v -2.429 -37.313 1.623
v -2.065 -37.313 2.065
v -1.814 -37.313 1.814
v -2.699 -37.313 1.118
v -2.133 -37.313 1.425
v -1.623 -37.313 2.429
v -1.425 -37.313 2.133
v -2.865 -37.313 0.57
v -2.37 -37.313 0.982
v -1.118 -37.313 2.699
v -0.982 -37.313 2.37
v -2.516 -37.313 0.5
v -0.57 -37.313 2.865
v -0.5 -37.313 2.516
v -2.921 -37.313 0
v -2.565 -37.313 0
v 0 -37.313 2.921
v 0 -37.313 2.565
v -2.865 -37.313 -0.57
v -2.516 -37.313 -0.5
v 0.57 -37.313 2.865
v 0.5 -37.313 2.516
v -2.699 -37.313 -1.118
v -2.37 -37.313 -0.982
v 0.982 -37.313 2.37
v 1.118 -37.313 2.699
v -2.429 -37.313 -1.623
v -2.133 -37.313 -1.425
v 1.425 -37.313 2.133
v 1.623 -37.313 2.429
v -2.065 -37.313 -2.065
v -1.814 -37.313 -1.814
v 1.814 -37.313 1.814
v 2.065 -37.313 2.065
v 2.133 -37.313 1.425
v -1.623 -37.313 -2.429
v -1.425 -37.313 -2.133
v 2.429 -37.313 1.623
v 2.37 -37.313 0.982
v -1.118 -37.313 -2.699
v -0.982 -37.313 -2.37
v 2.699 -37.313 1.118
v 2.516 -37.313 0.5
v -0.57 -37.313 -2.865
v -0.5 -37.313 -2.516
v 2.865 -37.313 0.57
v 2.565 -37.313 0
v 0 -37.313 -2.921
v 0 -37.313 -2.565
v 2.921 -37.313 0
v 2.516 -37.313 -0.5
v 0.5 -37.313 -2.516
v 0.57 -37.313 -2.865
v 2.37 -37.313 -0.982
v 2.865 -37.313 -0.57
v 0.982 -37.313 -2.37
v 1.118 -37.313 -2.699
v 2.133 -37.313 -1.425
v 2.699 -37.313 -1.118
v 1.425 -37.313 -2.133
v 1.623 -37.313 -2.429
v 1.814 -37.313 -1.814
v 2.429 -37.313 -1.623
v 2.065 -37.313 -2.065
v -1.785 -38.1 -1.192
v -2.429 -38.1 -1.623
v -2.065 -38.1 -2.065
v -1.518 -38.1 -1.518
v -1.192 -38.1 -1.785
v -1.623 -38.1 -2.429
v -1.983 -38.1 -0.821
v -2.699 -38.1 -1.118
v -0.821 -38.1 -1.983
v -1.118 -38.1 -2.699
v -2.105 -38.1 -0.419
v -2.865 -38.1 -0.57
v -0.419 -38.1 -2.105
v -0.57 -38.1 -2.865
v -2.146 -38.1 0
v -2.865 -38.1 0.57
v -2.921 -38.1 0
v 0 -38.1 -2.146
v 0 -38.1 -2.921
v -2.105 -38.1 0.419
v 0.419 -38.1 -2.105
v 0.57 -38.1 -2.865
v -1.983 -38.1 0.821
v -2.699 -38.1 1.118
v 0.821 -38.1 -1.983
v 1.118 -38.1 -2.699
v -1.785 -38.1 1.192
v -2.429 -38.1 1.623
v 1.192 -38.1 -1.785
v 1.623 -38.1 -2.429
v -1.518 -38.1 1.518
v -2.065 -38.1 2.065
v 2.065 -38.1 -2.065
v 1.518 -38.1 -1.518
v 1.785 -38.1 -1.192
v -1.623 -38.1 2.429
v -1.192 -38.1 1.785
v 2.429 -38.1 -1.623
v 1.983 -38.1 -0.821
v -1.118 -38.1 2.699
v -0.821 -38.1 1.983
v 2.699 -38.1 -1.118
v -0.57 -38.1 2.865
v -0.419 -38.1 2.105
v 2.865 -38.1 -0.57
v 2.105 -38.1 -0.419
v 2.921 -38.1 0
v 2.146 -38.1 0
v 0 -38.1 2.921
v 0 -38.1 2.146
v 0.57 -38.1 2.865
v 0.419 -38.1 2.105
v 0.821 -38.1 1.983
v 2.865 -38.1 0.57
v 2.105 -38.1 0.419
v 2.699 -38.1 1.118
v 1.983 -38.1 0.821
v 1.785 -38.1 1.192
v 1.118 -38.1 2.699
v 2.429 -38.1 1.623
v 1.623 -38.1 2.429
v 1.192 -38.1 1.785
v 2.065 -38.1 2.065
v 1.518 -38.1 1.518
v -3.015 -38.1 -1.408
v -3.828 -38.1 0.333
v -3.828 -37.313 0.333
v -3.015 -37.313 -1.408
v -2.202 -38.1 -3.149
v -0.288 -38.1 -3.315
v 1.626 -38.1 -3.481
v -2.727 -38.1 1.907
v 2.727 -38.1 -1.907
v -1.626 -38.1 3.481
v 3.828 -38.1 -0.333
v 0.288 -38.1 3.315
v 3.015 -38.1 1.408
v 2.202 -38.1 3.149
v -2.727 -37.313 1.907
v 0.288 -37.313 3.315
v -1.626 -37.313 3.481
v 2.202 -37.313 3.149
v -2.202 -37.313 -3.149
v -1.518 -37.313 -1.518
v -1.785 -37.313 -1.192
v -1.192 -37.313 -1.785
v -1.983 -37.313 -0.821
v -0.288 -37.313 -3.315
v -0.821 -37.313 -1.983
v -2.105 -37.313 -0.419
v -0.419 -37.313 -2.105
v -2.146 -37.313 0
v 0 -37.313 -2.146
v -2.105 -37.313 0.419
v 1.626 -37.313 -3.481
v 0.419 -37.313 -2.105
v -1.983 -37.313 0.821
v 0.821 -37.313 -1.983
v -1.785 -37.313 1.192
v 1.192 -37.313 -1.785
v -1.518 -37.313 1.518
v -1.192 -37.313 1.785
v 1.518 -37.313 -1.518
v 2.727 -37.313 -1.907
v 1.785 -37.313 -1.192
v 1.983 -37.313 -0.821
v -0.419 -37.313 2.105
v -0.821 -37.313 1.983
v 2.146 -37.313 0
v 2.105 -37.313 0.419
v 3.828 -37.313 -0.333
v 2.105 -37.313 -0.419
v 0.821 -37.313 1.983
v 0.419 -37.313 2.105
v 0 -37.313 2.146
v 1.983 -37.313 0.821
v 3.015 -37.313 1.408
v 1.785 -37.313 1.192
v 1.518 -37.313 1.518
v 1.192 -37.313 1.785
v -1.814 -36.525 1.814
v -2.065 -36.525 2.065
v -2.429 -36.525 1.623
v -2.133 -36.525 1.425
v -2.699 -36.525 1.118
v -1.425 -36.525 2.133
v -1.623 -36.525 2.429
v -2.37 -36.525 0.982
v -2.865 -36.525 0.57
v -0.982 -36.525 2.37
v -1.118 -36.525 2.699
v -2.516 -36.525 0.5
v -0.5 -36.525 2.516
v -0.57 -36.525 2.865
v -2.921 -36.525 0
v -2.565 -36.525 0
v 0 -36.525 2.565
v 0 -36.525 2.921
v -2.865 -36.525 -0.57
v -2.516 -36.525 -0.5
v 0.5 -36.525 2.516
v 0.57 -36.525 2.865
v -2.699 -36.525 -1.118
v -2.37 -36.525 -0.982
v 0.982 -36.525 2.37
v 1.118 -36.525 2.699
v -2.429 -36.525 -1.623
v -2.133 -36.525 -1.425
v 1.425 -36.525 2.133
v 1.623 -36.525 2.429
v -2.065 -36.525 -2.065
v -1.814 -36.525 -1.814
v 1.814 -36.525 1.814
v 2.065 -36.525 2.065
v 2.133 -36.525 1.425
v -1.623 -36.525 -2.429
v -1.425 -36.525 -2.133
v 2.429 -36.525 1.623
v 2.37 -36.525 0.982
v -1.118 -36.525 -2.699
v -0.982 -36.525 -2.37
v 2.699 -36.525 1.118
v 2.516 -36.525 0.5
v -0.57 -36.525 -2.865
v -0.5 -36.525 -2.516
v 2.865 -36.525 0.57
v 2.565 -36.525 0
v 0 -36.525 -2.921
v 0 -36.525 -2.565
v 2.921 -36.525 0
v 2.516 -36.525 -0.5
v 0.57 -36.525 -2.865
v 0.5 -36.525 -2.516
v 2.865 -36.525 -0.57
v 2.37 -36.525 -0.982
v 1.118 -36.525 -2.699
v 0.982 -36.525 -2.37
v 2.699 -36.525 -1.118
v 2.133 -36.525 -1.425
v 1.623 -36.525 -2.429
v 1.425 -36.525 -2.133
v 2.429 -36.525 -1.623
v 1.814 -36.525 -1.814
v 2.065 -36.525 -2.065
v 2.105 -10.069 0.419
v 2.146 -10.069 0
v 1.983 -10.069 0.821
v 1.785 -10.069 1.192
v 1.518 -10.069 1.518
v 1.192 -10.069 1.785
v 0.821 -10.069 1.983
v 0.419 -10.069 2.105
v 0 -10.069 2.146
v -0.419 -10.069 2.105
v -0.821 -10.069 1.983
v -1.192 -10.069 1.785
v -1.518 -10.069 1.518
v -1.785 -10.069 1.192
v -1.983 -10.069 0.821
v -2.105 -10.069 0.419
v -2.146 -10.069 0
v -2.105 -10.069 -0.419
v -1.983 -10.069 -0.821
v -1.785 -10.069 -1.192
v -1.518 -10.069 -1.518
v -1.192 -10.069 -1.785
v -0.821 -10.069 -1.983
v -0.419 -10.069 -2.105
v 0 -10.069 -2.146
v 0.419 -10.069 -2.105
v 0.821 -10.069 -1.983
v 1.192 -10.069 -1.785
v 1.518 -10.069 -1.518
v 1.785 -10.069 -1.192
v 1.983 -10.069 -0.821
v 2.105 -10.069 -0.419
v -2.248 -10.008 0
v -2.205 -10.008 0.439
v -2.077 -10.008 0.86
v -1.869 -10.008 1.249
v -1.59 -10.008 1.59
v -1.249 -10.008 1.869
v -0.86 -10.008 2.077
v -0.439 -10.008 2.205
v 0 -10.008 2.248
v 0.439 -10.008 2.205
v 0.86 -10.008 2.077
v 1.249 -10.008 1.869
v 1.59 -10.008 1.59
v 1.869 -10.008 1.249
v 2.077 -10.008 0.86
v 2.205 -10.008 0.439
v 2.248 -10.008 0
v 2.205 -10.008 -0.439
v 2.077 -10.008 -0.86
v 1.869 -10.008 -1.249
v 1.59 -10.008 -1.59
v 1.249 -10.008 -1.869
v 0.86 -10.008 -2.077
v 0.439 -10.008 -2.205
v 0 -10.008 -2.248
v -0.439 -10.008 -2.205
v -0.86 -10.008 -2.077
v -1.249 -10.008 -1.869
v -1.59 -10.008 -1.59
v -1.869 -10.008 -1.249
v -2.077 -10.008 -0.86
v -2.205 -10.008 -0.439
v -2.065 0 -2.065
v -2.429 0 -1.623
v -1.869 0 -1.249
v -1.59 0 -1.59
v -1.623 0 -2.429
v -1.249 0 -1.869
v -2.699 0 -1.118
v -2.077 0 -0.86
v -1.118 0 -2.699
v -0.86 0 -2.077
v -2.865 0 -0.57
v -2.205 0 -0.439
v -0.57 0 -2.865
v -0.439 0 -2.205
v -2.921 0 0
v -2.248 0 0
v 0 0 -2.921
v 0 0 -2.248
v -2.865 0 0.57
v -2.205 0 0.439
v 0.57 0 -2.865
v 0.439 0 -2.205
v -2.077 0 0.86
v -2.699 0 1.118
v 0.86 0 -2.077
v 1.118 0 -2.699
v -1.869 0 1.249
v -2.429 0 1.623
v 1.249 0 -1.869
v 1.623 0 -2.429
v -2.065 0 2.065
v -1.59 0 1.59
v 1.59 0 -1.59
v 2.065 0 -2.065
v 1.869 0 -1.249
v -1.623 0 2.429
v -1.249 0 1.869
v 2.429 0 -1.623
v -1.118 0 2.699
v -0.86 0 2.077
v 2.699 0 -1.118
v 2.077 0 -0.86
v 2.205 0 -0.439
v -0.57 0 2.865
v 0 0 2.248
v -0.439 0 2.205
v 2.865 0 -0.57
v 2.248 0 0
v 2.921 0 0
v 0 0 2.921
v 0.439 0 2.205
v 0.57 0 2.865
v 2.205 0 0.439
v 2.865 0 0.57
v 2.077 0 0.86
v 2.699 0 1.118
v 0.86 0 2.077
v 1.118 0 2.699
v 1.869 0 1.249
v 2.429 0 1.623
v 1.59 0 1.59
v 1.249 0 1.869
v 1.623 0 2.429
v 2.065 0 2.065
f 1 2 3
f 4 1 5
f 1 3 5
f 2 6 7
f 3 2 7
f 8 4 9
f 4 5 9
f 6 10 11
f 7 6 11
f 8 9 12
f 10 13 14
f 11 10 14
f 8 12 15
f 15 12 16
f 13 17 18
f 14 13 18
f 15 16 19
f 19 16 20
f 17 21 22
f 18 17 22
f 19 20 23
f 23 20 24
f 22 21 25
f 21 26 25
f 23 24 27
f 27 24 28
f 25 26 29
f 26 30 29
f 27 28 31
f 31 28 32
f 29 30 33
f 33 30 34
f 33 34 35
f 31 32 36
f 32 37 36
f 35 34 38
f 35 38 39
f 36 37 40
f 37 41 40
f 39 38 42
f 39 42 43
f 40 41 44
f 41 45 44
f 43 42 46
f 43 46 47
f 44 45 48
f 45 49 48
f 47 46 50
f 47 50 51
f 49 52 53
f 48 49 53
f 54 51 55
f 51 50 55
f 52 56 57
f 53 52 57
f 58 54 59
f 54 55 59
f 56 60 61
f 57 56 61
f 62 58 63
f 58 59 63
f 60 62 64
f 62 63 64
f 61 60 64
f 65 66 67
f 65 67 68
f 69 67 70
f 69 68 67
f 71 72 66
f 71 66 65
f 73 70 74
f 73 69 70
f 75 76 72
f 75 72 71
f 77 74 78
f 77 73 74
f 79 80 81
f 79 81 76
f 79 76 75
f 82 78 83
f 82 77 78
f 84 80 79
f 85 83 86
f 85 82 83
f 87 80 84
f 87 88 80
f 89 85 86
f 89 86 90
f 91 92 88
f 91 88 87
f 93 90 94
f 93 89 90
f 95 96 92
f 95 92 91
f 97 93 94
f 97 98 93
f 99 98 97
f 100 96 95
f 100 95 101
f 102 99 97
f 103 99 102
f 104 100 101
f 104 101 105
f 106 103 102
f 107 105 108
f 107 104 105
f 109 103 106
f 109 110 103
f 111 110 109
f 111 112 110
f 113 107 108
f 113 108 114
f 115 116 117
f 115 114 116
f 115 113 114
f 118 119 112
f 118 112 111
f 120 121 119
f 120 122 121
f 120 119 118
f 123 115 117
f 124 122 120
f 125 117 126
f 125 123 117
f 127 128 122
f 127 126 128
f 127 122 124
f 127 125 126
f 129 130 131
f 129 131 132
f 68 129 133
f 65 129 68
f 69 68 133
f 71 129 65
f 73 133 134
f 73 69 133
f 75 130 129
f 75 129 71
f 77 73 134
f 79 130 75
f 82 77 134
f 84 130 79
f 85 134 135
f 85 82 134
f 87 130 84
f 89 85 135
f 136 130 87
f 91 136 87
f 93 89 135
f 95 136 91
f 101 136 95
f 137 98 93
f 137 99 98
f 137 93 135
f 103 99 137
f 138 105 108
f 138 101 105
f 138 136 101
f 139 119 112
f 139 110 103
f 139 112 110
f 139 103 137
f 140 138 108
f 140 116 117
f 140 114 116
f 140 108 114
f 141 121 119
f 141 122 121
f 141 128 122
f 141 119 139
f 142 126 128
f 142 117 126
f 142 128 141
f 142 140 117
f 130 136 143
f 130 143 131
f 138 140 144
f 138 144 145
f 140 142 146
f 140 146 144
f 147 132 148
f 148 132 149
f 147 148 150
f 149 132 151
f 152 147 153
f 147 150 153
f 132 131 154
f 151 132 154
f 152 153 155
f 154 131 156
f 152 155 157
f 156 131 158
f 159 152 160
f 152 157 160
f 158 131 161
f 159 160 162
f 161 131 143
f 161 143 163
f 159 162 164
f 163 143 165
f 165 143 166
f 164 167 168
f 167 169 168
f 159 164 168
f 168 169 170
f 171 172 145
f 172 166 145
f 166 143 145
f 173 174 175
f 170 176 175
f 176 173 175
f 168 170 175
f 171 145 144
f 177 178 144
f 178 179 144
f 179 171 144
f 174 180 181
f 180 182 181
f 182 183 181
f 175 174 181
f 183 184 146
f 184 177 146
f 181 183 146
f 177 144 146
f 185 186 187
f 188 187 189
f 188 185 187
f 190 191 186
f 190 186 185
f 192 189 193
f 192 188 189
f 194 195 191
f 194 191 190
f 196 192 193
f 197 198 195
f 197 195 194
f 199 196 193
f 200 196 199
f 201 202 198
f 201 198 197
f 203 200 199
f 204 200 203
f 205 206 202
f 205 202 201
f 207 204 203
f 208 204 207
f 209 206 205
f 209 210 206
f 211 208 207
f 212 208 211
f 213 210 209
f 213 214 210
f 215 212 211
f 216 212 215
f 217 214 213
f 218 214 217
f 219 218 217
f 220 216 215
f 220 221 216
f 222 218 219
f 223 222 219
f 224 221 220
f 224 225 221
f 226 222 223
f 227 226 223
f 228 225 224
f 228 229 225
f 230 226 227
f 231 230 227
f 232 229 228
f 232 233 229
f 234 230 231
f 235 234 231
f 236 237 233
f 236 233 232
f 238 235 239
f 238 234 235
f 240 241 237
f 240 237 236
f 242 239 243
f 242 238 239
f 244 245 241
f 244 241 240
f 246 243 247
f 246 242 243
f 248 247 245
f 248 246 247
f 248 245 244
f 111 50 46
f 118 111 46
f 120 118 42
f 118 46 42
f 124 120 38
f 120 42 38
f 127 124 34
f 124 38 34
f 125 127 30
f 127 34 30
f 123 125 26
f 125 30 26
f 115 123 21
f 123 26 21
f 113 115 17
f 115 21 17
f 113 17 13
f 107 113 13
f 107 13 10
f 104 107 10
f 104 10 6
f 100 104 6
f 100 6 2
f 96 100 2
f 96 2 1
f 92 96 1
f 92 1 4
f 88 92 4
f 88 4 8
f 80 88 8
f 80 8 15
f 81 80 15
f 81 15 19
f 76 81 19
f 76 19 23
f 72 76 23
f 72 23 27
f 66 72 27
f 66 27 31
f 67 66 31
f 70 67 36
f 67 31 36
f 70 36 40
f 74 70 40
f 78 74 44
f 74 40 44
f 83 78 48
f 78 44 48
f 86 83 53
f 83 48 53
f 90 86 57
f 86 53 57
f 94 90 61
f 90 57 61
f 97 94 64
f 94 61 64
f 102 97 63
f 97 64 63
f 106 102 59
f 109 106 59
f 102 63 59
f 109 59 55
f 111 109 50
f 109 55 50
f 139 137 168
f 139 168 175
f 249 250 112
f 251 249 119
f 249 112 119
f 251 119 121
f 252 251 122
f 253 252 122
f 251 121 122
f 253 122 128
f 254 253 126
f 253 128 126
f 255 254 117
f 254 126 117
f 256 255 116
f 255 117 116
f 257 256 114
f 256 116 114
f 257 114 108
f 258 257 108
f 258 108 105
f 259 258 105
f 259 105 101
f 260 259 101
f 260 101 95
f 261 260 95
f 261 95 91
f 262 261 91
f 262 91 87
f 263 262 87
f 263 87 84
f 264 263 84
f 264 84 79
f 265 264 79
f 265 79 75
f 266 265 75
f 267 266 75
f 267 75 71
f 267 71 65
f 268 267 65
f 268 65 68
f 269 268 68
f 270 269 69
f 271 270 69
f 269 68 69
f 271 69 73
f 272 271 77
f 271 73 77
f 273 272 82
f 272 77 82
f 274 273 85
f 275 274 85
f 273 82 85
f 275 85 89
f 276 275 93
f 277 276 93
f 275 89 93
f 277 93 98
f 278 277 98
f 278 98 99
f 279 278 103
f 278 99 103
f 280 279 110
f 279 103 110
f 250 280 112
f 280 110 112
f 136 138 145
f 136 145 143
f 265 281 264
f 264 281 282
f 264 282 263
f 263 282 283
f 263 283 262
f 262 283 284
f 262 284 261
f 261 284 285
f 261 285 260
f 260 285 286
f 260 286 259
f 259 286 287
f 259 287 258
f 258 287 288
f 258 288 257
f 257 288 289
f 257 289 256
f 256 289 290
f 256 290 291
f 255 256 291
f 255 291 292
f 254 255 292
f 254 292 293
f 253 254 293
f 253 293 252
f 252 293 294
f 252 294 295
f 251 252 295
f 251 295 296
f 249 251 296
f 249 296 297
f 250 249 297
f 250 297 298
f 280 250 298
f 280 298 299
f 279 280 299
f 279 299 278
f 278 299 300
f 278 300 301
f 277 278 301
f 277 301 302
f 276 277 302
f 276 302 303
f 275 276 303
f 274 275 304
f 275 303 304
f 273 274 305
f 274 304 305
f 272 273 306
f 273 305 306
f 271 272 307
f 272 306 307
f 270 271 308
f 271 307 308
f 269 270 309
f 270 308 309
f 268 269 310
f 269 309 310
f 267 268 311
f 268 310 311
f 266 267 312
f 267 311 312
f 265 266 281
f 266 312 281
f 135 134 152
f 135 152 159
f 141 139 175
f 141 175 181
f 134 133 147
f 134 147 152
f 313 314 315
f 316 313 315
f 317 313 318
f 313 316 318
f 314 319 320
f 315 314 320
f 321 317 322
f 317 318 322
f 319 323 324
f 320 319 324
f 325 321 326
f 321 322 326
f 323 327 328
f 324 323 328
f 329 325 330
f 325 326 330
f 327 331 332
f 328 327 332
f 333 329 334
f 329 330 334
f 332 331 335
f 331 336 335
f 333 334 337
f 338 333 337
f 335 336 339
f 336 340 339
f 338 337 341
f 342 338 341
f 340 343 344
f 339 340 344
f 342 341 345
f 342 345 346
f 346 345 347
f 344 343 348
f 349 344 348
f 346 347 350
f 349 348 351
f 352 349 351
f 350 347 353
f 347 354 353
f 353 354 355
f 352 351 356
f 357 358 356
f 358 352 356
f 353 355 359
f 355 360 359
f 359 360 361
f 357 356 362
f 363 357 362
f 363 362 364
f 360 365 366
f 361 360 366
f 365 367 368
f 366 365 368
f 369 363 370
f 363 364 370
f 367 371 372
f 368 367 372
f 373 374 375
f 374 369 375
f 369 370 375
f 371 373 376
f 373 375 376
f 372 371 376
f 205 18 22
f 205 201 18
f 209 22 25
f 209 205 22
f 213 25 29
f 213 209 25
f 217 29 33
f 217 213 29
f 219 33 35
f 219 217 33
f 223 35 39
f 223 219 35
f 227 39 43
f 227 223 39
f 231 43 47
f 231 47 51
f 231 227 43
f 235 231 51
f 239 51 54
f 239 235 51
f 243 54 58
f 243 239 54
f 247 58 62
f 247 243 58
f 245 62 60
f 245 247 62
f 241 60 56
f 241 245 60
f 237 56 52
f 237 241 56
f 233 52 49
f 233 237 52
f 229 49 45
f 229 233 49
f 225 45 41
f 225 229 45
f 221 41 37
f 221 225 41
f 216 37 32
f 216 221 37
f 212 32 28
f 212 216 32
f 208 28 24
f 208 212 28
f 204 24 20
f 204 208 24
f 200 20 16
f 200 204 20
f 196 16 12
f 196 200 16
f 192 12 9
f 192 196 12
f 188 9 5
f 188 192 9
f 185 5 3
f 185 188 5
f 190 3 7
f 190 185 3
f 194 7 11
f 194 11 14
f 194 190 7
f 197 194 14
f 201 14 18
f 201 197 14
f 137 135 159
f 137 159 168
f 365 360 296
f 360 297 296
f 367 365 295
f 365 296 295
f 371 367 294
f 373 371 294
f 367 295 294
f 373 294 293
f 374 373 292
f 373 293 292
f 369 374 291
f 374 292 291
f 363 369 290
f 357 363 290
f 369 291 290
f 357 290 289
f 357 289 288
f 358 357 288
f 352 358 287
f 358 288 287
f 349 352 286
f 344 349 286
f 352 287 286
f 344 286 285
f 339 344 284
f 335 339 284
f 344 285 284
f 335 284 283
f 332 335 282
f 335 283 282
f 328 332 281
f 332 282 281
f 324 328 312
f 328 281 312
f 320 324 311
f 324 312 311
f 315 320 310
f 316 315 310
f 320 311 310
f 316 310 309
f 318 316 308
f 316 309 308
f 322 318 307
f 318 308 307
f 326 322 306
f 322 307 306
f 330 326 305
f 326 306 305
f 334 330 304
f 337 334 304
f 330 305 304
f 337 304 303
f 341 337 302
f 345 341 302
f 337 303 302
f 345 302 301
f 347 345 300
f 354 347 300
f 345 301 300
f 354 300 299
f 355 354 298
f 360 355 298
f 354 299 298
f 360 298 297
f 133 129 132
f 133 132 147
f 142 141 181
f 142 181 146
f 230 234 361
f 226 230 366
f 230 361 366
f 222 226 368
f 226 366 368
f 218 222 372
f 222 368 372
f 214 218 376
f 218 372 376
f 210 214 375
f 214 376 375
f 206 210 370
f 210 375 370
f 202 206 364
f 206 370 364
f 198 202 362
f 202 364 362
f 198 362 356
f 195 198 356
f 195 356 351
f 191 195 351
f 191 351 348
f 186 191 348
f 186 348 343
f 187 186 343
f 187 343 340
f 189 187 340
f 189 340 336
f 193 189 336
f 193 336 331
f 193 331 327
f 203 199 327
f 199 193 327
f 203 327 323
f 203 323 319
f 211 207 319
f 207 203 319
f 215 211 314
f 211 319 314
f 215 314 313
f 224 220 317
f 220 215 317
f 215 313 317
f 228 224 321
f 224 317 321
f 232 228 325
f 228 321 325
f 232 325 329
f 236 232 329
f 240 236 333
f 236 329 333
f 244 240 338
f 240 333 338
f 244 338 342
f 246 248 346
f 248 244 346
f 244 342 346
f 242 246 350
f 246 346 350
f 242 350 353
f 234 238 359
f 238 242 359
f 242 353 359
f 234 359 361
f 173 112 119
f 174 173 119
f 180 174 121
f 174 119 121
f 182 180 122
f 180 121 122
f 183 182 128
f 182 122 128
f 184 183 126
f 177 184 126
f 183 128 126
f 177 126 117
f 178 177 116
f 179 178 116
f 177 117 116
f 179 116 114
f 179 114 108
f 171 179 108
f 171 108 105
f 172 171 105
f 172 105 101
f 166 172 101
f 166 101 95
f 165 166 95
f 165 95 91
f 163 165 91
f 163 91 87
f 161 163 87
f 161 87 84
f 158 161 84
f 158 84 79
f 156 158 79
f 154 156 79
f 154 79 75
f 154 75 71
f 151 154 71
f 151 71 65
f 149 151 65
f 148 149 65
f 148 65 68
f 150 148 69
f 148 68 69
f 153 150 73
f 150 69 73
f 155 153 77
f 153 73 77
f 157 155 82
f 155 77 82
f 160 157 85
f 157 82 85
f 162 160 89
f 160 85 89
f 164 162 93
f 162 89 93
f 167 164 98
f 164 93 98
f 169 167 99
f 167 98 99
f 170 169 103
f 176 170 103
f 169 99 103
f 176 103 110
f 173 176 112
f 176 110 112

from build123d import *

# Parameters (mm, degrees)
F0_R      = 2.921
F1_DEPTH  = 38.1
F3_DEPTH  = 0.7874
F5_W      = 0.7874
F5_H      = 0.3556
F8_D      = 4.4958
F8_DEPTH  = 10.0076
F8_TIP    = 1.3506745855
F9_R      = 2.1463
F10_DEPTH = 35.56


with BuildPart() as f1:
    # F0 (on Front) → F1 (new body)
    with BuildSketch(Plane.XZ):
        Circle(F0_R)
    extrude(amount=F1_DEPTH)

    # F5 (on Right) → F6 (revolve, cut)
    with BuildSketch(Plane.YZ):
        with Locations((-36.9189, 2.7432)):
            Rectangle(F5_W, F5_H)
    revolve(axis=Axis((0, -34.1169198469, 0), (0, 1, 0)), mode=Mode.SUBTRACT)

    # F8
    with Locations(Plane(origin=(0, 0, 0), x_dir=(-1, 0, 0), z_dir=(0, 1, 0))):
        with Locations((0, 0)):
            Hole(F8_D / 2, depth=F8_DEPTH)
            with Locations((0, 0, -(F8_DEPTH + F8_TIP / 2))):  # 118° drill point
                Cone(0, F8_D / 2, F8_TIP, mode=Mode.SUBTRACT)


with BuildPart() as f3:
    # F2 (on face) → F3 (new body)
    with BuildSketch(Plane.XZ.offset(38.1)):
        with BuildLine():
            ThreePointArc((2.7267165445, -1.9069891573), (3.1736782595, -0.9996784808), (3.3274, 0))
            ThreePointArc((3.3274, 0), (3.2483252364, 0.7210921708), (3.0148593263, 1.4079112197))
            ThreePointArc((3.0148593263, 1.4079112197), (1.9069891486, 2.7267165505), (0.2881427638, 3.3149003767))
            ThreePointArc((0.2881427638, 3.3149003767), (-1.4079112403, 3.0148593167), (-2.7267165621, 1.9069891321))
            ThreePointArc((-2.7267165621, 1.9069891321), (-3.3149003765, 0.2881427663), (-3.0148593263, -1.4079112197))
            ThreePointArc((-3.0148593263, -1.4079112197), (-1.9069891539, -2.7267165469), (-0.2881427766, -3.3149003756))
            ThreePointArc((-0.2881427766, -3.3149003756), (1.4079112206, -3.0148593259), (2.7267165445, -1.9069891573))
        make_face()
        with BuildLine():
            ThreePointArc((3.0148593263, 1.4079112197), (3.2483252364, 0.7210921708), (3.3274, 0))
            ThreePointArc((3.3274, 0), (3.1736782595, -0.9996784808), (2.7267165445, -1.9069891573))
            Line((2.7267165445, -1.9069891573), (3.8277172487, -0.332718616))
            Line((3.8277172487, -0.332718616), (3.0148593263, 1.4079112197))
        make_face()
        with BuildLine():
            ThreePointArc((0.2881427638, 3.3149003767), (1.9069891486, 2.7267165505), (3.0148593263, 1.4079112197))
            Line((3.0148593263, 1.4079112197), (2.2020013981, 3.1485410679))
            Line((2.2020013981, 3.1485410679), (0.2881427638, 3.3149003767))
        make_face()
        with BuildLine():
            Line((1.6257158506, -3.4812596839), (2.7267165445, -1.9069891573))
            ThreePointArc((2.7267165445, -1.9069891573), (1.4079112206, -3.0148593259), (-0.2881427766, -3.3149003756))
            Line((-0.2881427766, -3.3149003756), (1.6257158506, -3.4812596839))
        make_face()
        with BuildLine():
            ThreePointArc((-2.7267165621, 1.9069891321), (-1.4079112403, 3.0148593167), (0.2881427638, 3.3149003767))
            Line((0.2881427638, 3.3149003767), (-1.6257158506, 3.4812596839))
            Line((-1.6257158506, 3.4812596839), (-2.7267165621, 1.9069891321))
        make_face()
        with BuildLine():
            Line((-2.2020013981, -3.1485410679), (-0.2881427766, -3.3149003756))
            ThreePointArc((-0.2881427766, -3.3149003756), (-1.9069891539, -2.7267165469), (-3.0148593263, -1.4079112197))
            Line((-3.0148593263, -1.4079112197), (-2.2020013981, -3.1485410679))
        make_face()
        with BuildLine():
            ThreePointArc((-3.0148593263, -1.4079112197), (-3.3149003765, 0.2881427663), (-2.7267165621, 1.9069891321))
            Line((-2.7267165621, 1.9069891321), (-3.8277172487, 0.332718616))
            Line((-3.8277172487, 0.332718616), (-3.0148593263, -1.4079112197))
        make_face()
    extrude(amount=-F3_DEPTH)


with BuildPart() as f10_tool:
    # F9 (on face) → F10 (new body)
    with BuildSketch(Plane.XZ.offset(38.1)):
        Circle(F9_R)
    extrude(amount=-F10_DEPTH)


with BuildPart() as f1_1:
    add(f1.part)

    # F10: cut by f10_tool
    add(f10_tool.part, mode=Mode.SUBTRACT)


with BuildPart() as f3_1:
    add(f3.part)

    # F10: cut by f10_tool
    add(f10_tool.part, mode=Mode.SUBTRACT)


solid = Compound([f1_1.part, f3_1.part])
